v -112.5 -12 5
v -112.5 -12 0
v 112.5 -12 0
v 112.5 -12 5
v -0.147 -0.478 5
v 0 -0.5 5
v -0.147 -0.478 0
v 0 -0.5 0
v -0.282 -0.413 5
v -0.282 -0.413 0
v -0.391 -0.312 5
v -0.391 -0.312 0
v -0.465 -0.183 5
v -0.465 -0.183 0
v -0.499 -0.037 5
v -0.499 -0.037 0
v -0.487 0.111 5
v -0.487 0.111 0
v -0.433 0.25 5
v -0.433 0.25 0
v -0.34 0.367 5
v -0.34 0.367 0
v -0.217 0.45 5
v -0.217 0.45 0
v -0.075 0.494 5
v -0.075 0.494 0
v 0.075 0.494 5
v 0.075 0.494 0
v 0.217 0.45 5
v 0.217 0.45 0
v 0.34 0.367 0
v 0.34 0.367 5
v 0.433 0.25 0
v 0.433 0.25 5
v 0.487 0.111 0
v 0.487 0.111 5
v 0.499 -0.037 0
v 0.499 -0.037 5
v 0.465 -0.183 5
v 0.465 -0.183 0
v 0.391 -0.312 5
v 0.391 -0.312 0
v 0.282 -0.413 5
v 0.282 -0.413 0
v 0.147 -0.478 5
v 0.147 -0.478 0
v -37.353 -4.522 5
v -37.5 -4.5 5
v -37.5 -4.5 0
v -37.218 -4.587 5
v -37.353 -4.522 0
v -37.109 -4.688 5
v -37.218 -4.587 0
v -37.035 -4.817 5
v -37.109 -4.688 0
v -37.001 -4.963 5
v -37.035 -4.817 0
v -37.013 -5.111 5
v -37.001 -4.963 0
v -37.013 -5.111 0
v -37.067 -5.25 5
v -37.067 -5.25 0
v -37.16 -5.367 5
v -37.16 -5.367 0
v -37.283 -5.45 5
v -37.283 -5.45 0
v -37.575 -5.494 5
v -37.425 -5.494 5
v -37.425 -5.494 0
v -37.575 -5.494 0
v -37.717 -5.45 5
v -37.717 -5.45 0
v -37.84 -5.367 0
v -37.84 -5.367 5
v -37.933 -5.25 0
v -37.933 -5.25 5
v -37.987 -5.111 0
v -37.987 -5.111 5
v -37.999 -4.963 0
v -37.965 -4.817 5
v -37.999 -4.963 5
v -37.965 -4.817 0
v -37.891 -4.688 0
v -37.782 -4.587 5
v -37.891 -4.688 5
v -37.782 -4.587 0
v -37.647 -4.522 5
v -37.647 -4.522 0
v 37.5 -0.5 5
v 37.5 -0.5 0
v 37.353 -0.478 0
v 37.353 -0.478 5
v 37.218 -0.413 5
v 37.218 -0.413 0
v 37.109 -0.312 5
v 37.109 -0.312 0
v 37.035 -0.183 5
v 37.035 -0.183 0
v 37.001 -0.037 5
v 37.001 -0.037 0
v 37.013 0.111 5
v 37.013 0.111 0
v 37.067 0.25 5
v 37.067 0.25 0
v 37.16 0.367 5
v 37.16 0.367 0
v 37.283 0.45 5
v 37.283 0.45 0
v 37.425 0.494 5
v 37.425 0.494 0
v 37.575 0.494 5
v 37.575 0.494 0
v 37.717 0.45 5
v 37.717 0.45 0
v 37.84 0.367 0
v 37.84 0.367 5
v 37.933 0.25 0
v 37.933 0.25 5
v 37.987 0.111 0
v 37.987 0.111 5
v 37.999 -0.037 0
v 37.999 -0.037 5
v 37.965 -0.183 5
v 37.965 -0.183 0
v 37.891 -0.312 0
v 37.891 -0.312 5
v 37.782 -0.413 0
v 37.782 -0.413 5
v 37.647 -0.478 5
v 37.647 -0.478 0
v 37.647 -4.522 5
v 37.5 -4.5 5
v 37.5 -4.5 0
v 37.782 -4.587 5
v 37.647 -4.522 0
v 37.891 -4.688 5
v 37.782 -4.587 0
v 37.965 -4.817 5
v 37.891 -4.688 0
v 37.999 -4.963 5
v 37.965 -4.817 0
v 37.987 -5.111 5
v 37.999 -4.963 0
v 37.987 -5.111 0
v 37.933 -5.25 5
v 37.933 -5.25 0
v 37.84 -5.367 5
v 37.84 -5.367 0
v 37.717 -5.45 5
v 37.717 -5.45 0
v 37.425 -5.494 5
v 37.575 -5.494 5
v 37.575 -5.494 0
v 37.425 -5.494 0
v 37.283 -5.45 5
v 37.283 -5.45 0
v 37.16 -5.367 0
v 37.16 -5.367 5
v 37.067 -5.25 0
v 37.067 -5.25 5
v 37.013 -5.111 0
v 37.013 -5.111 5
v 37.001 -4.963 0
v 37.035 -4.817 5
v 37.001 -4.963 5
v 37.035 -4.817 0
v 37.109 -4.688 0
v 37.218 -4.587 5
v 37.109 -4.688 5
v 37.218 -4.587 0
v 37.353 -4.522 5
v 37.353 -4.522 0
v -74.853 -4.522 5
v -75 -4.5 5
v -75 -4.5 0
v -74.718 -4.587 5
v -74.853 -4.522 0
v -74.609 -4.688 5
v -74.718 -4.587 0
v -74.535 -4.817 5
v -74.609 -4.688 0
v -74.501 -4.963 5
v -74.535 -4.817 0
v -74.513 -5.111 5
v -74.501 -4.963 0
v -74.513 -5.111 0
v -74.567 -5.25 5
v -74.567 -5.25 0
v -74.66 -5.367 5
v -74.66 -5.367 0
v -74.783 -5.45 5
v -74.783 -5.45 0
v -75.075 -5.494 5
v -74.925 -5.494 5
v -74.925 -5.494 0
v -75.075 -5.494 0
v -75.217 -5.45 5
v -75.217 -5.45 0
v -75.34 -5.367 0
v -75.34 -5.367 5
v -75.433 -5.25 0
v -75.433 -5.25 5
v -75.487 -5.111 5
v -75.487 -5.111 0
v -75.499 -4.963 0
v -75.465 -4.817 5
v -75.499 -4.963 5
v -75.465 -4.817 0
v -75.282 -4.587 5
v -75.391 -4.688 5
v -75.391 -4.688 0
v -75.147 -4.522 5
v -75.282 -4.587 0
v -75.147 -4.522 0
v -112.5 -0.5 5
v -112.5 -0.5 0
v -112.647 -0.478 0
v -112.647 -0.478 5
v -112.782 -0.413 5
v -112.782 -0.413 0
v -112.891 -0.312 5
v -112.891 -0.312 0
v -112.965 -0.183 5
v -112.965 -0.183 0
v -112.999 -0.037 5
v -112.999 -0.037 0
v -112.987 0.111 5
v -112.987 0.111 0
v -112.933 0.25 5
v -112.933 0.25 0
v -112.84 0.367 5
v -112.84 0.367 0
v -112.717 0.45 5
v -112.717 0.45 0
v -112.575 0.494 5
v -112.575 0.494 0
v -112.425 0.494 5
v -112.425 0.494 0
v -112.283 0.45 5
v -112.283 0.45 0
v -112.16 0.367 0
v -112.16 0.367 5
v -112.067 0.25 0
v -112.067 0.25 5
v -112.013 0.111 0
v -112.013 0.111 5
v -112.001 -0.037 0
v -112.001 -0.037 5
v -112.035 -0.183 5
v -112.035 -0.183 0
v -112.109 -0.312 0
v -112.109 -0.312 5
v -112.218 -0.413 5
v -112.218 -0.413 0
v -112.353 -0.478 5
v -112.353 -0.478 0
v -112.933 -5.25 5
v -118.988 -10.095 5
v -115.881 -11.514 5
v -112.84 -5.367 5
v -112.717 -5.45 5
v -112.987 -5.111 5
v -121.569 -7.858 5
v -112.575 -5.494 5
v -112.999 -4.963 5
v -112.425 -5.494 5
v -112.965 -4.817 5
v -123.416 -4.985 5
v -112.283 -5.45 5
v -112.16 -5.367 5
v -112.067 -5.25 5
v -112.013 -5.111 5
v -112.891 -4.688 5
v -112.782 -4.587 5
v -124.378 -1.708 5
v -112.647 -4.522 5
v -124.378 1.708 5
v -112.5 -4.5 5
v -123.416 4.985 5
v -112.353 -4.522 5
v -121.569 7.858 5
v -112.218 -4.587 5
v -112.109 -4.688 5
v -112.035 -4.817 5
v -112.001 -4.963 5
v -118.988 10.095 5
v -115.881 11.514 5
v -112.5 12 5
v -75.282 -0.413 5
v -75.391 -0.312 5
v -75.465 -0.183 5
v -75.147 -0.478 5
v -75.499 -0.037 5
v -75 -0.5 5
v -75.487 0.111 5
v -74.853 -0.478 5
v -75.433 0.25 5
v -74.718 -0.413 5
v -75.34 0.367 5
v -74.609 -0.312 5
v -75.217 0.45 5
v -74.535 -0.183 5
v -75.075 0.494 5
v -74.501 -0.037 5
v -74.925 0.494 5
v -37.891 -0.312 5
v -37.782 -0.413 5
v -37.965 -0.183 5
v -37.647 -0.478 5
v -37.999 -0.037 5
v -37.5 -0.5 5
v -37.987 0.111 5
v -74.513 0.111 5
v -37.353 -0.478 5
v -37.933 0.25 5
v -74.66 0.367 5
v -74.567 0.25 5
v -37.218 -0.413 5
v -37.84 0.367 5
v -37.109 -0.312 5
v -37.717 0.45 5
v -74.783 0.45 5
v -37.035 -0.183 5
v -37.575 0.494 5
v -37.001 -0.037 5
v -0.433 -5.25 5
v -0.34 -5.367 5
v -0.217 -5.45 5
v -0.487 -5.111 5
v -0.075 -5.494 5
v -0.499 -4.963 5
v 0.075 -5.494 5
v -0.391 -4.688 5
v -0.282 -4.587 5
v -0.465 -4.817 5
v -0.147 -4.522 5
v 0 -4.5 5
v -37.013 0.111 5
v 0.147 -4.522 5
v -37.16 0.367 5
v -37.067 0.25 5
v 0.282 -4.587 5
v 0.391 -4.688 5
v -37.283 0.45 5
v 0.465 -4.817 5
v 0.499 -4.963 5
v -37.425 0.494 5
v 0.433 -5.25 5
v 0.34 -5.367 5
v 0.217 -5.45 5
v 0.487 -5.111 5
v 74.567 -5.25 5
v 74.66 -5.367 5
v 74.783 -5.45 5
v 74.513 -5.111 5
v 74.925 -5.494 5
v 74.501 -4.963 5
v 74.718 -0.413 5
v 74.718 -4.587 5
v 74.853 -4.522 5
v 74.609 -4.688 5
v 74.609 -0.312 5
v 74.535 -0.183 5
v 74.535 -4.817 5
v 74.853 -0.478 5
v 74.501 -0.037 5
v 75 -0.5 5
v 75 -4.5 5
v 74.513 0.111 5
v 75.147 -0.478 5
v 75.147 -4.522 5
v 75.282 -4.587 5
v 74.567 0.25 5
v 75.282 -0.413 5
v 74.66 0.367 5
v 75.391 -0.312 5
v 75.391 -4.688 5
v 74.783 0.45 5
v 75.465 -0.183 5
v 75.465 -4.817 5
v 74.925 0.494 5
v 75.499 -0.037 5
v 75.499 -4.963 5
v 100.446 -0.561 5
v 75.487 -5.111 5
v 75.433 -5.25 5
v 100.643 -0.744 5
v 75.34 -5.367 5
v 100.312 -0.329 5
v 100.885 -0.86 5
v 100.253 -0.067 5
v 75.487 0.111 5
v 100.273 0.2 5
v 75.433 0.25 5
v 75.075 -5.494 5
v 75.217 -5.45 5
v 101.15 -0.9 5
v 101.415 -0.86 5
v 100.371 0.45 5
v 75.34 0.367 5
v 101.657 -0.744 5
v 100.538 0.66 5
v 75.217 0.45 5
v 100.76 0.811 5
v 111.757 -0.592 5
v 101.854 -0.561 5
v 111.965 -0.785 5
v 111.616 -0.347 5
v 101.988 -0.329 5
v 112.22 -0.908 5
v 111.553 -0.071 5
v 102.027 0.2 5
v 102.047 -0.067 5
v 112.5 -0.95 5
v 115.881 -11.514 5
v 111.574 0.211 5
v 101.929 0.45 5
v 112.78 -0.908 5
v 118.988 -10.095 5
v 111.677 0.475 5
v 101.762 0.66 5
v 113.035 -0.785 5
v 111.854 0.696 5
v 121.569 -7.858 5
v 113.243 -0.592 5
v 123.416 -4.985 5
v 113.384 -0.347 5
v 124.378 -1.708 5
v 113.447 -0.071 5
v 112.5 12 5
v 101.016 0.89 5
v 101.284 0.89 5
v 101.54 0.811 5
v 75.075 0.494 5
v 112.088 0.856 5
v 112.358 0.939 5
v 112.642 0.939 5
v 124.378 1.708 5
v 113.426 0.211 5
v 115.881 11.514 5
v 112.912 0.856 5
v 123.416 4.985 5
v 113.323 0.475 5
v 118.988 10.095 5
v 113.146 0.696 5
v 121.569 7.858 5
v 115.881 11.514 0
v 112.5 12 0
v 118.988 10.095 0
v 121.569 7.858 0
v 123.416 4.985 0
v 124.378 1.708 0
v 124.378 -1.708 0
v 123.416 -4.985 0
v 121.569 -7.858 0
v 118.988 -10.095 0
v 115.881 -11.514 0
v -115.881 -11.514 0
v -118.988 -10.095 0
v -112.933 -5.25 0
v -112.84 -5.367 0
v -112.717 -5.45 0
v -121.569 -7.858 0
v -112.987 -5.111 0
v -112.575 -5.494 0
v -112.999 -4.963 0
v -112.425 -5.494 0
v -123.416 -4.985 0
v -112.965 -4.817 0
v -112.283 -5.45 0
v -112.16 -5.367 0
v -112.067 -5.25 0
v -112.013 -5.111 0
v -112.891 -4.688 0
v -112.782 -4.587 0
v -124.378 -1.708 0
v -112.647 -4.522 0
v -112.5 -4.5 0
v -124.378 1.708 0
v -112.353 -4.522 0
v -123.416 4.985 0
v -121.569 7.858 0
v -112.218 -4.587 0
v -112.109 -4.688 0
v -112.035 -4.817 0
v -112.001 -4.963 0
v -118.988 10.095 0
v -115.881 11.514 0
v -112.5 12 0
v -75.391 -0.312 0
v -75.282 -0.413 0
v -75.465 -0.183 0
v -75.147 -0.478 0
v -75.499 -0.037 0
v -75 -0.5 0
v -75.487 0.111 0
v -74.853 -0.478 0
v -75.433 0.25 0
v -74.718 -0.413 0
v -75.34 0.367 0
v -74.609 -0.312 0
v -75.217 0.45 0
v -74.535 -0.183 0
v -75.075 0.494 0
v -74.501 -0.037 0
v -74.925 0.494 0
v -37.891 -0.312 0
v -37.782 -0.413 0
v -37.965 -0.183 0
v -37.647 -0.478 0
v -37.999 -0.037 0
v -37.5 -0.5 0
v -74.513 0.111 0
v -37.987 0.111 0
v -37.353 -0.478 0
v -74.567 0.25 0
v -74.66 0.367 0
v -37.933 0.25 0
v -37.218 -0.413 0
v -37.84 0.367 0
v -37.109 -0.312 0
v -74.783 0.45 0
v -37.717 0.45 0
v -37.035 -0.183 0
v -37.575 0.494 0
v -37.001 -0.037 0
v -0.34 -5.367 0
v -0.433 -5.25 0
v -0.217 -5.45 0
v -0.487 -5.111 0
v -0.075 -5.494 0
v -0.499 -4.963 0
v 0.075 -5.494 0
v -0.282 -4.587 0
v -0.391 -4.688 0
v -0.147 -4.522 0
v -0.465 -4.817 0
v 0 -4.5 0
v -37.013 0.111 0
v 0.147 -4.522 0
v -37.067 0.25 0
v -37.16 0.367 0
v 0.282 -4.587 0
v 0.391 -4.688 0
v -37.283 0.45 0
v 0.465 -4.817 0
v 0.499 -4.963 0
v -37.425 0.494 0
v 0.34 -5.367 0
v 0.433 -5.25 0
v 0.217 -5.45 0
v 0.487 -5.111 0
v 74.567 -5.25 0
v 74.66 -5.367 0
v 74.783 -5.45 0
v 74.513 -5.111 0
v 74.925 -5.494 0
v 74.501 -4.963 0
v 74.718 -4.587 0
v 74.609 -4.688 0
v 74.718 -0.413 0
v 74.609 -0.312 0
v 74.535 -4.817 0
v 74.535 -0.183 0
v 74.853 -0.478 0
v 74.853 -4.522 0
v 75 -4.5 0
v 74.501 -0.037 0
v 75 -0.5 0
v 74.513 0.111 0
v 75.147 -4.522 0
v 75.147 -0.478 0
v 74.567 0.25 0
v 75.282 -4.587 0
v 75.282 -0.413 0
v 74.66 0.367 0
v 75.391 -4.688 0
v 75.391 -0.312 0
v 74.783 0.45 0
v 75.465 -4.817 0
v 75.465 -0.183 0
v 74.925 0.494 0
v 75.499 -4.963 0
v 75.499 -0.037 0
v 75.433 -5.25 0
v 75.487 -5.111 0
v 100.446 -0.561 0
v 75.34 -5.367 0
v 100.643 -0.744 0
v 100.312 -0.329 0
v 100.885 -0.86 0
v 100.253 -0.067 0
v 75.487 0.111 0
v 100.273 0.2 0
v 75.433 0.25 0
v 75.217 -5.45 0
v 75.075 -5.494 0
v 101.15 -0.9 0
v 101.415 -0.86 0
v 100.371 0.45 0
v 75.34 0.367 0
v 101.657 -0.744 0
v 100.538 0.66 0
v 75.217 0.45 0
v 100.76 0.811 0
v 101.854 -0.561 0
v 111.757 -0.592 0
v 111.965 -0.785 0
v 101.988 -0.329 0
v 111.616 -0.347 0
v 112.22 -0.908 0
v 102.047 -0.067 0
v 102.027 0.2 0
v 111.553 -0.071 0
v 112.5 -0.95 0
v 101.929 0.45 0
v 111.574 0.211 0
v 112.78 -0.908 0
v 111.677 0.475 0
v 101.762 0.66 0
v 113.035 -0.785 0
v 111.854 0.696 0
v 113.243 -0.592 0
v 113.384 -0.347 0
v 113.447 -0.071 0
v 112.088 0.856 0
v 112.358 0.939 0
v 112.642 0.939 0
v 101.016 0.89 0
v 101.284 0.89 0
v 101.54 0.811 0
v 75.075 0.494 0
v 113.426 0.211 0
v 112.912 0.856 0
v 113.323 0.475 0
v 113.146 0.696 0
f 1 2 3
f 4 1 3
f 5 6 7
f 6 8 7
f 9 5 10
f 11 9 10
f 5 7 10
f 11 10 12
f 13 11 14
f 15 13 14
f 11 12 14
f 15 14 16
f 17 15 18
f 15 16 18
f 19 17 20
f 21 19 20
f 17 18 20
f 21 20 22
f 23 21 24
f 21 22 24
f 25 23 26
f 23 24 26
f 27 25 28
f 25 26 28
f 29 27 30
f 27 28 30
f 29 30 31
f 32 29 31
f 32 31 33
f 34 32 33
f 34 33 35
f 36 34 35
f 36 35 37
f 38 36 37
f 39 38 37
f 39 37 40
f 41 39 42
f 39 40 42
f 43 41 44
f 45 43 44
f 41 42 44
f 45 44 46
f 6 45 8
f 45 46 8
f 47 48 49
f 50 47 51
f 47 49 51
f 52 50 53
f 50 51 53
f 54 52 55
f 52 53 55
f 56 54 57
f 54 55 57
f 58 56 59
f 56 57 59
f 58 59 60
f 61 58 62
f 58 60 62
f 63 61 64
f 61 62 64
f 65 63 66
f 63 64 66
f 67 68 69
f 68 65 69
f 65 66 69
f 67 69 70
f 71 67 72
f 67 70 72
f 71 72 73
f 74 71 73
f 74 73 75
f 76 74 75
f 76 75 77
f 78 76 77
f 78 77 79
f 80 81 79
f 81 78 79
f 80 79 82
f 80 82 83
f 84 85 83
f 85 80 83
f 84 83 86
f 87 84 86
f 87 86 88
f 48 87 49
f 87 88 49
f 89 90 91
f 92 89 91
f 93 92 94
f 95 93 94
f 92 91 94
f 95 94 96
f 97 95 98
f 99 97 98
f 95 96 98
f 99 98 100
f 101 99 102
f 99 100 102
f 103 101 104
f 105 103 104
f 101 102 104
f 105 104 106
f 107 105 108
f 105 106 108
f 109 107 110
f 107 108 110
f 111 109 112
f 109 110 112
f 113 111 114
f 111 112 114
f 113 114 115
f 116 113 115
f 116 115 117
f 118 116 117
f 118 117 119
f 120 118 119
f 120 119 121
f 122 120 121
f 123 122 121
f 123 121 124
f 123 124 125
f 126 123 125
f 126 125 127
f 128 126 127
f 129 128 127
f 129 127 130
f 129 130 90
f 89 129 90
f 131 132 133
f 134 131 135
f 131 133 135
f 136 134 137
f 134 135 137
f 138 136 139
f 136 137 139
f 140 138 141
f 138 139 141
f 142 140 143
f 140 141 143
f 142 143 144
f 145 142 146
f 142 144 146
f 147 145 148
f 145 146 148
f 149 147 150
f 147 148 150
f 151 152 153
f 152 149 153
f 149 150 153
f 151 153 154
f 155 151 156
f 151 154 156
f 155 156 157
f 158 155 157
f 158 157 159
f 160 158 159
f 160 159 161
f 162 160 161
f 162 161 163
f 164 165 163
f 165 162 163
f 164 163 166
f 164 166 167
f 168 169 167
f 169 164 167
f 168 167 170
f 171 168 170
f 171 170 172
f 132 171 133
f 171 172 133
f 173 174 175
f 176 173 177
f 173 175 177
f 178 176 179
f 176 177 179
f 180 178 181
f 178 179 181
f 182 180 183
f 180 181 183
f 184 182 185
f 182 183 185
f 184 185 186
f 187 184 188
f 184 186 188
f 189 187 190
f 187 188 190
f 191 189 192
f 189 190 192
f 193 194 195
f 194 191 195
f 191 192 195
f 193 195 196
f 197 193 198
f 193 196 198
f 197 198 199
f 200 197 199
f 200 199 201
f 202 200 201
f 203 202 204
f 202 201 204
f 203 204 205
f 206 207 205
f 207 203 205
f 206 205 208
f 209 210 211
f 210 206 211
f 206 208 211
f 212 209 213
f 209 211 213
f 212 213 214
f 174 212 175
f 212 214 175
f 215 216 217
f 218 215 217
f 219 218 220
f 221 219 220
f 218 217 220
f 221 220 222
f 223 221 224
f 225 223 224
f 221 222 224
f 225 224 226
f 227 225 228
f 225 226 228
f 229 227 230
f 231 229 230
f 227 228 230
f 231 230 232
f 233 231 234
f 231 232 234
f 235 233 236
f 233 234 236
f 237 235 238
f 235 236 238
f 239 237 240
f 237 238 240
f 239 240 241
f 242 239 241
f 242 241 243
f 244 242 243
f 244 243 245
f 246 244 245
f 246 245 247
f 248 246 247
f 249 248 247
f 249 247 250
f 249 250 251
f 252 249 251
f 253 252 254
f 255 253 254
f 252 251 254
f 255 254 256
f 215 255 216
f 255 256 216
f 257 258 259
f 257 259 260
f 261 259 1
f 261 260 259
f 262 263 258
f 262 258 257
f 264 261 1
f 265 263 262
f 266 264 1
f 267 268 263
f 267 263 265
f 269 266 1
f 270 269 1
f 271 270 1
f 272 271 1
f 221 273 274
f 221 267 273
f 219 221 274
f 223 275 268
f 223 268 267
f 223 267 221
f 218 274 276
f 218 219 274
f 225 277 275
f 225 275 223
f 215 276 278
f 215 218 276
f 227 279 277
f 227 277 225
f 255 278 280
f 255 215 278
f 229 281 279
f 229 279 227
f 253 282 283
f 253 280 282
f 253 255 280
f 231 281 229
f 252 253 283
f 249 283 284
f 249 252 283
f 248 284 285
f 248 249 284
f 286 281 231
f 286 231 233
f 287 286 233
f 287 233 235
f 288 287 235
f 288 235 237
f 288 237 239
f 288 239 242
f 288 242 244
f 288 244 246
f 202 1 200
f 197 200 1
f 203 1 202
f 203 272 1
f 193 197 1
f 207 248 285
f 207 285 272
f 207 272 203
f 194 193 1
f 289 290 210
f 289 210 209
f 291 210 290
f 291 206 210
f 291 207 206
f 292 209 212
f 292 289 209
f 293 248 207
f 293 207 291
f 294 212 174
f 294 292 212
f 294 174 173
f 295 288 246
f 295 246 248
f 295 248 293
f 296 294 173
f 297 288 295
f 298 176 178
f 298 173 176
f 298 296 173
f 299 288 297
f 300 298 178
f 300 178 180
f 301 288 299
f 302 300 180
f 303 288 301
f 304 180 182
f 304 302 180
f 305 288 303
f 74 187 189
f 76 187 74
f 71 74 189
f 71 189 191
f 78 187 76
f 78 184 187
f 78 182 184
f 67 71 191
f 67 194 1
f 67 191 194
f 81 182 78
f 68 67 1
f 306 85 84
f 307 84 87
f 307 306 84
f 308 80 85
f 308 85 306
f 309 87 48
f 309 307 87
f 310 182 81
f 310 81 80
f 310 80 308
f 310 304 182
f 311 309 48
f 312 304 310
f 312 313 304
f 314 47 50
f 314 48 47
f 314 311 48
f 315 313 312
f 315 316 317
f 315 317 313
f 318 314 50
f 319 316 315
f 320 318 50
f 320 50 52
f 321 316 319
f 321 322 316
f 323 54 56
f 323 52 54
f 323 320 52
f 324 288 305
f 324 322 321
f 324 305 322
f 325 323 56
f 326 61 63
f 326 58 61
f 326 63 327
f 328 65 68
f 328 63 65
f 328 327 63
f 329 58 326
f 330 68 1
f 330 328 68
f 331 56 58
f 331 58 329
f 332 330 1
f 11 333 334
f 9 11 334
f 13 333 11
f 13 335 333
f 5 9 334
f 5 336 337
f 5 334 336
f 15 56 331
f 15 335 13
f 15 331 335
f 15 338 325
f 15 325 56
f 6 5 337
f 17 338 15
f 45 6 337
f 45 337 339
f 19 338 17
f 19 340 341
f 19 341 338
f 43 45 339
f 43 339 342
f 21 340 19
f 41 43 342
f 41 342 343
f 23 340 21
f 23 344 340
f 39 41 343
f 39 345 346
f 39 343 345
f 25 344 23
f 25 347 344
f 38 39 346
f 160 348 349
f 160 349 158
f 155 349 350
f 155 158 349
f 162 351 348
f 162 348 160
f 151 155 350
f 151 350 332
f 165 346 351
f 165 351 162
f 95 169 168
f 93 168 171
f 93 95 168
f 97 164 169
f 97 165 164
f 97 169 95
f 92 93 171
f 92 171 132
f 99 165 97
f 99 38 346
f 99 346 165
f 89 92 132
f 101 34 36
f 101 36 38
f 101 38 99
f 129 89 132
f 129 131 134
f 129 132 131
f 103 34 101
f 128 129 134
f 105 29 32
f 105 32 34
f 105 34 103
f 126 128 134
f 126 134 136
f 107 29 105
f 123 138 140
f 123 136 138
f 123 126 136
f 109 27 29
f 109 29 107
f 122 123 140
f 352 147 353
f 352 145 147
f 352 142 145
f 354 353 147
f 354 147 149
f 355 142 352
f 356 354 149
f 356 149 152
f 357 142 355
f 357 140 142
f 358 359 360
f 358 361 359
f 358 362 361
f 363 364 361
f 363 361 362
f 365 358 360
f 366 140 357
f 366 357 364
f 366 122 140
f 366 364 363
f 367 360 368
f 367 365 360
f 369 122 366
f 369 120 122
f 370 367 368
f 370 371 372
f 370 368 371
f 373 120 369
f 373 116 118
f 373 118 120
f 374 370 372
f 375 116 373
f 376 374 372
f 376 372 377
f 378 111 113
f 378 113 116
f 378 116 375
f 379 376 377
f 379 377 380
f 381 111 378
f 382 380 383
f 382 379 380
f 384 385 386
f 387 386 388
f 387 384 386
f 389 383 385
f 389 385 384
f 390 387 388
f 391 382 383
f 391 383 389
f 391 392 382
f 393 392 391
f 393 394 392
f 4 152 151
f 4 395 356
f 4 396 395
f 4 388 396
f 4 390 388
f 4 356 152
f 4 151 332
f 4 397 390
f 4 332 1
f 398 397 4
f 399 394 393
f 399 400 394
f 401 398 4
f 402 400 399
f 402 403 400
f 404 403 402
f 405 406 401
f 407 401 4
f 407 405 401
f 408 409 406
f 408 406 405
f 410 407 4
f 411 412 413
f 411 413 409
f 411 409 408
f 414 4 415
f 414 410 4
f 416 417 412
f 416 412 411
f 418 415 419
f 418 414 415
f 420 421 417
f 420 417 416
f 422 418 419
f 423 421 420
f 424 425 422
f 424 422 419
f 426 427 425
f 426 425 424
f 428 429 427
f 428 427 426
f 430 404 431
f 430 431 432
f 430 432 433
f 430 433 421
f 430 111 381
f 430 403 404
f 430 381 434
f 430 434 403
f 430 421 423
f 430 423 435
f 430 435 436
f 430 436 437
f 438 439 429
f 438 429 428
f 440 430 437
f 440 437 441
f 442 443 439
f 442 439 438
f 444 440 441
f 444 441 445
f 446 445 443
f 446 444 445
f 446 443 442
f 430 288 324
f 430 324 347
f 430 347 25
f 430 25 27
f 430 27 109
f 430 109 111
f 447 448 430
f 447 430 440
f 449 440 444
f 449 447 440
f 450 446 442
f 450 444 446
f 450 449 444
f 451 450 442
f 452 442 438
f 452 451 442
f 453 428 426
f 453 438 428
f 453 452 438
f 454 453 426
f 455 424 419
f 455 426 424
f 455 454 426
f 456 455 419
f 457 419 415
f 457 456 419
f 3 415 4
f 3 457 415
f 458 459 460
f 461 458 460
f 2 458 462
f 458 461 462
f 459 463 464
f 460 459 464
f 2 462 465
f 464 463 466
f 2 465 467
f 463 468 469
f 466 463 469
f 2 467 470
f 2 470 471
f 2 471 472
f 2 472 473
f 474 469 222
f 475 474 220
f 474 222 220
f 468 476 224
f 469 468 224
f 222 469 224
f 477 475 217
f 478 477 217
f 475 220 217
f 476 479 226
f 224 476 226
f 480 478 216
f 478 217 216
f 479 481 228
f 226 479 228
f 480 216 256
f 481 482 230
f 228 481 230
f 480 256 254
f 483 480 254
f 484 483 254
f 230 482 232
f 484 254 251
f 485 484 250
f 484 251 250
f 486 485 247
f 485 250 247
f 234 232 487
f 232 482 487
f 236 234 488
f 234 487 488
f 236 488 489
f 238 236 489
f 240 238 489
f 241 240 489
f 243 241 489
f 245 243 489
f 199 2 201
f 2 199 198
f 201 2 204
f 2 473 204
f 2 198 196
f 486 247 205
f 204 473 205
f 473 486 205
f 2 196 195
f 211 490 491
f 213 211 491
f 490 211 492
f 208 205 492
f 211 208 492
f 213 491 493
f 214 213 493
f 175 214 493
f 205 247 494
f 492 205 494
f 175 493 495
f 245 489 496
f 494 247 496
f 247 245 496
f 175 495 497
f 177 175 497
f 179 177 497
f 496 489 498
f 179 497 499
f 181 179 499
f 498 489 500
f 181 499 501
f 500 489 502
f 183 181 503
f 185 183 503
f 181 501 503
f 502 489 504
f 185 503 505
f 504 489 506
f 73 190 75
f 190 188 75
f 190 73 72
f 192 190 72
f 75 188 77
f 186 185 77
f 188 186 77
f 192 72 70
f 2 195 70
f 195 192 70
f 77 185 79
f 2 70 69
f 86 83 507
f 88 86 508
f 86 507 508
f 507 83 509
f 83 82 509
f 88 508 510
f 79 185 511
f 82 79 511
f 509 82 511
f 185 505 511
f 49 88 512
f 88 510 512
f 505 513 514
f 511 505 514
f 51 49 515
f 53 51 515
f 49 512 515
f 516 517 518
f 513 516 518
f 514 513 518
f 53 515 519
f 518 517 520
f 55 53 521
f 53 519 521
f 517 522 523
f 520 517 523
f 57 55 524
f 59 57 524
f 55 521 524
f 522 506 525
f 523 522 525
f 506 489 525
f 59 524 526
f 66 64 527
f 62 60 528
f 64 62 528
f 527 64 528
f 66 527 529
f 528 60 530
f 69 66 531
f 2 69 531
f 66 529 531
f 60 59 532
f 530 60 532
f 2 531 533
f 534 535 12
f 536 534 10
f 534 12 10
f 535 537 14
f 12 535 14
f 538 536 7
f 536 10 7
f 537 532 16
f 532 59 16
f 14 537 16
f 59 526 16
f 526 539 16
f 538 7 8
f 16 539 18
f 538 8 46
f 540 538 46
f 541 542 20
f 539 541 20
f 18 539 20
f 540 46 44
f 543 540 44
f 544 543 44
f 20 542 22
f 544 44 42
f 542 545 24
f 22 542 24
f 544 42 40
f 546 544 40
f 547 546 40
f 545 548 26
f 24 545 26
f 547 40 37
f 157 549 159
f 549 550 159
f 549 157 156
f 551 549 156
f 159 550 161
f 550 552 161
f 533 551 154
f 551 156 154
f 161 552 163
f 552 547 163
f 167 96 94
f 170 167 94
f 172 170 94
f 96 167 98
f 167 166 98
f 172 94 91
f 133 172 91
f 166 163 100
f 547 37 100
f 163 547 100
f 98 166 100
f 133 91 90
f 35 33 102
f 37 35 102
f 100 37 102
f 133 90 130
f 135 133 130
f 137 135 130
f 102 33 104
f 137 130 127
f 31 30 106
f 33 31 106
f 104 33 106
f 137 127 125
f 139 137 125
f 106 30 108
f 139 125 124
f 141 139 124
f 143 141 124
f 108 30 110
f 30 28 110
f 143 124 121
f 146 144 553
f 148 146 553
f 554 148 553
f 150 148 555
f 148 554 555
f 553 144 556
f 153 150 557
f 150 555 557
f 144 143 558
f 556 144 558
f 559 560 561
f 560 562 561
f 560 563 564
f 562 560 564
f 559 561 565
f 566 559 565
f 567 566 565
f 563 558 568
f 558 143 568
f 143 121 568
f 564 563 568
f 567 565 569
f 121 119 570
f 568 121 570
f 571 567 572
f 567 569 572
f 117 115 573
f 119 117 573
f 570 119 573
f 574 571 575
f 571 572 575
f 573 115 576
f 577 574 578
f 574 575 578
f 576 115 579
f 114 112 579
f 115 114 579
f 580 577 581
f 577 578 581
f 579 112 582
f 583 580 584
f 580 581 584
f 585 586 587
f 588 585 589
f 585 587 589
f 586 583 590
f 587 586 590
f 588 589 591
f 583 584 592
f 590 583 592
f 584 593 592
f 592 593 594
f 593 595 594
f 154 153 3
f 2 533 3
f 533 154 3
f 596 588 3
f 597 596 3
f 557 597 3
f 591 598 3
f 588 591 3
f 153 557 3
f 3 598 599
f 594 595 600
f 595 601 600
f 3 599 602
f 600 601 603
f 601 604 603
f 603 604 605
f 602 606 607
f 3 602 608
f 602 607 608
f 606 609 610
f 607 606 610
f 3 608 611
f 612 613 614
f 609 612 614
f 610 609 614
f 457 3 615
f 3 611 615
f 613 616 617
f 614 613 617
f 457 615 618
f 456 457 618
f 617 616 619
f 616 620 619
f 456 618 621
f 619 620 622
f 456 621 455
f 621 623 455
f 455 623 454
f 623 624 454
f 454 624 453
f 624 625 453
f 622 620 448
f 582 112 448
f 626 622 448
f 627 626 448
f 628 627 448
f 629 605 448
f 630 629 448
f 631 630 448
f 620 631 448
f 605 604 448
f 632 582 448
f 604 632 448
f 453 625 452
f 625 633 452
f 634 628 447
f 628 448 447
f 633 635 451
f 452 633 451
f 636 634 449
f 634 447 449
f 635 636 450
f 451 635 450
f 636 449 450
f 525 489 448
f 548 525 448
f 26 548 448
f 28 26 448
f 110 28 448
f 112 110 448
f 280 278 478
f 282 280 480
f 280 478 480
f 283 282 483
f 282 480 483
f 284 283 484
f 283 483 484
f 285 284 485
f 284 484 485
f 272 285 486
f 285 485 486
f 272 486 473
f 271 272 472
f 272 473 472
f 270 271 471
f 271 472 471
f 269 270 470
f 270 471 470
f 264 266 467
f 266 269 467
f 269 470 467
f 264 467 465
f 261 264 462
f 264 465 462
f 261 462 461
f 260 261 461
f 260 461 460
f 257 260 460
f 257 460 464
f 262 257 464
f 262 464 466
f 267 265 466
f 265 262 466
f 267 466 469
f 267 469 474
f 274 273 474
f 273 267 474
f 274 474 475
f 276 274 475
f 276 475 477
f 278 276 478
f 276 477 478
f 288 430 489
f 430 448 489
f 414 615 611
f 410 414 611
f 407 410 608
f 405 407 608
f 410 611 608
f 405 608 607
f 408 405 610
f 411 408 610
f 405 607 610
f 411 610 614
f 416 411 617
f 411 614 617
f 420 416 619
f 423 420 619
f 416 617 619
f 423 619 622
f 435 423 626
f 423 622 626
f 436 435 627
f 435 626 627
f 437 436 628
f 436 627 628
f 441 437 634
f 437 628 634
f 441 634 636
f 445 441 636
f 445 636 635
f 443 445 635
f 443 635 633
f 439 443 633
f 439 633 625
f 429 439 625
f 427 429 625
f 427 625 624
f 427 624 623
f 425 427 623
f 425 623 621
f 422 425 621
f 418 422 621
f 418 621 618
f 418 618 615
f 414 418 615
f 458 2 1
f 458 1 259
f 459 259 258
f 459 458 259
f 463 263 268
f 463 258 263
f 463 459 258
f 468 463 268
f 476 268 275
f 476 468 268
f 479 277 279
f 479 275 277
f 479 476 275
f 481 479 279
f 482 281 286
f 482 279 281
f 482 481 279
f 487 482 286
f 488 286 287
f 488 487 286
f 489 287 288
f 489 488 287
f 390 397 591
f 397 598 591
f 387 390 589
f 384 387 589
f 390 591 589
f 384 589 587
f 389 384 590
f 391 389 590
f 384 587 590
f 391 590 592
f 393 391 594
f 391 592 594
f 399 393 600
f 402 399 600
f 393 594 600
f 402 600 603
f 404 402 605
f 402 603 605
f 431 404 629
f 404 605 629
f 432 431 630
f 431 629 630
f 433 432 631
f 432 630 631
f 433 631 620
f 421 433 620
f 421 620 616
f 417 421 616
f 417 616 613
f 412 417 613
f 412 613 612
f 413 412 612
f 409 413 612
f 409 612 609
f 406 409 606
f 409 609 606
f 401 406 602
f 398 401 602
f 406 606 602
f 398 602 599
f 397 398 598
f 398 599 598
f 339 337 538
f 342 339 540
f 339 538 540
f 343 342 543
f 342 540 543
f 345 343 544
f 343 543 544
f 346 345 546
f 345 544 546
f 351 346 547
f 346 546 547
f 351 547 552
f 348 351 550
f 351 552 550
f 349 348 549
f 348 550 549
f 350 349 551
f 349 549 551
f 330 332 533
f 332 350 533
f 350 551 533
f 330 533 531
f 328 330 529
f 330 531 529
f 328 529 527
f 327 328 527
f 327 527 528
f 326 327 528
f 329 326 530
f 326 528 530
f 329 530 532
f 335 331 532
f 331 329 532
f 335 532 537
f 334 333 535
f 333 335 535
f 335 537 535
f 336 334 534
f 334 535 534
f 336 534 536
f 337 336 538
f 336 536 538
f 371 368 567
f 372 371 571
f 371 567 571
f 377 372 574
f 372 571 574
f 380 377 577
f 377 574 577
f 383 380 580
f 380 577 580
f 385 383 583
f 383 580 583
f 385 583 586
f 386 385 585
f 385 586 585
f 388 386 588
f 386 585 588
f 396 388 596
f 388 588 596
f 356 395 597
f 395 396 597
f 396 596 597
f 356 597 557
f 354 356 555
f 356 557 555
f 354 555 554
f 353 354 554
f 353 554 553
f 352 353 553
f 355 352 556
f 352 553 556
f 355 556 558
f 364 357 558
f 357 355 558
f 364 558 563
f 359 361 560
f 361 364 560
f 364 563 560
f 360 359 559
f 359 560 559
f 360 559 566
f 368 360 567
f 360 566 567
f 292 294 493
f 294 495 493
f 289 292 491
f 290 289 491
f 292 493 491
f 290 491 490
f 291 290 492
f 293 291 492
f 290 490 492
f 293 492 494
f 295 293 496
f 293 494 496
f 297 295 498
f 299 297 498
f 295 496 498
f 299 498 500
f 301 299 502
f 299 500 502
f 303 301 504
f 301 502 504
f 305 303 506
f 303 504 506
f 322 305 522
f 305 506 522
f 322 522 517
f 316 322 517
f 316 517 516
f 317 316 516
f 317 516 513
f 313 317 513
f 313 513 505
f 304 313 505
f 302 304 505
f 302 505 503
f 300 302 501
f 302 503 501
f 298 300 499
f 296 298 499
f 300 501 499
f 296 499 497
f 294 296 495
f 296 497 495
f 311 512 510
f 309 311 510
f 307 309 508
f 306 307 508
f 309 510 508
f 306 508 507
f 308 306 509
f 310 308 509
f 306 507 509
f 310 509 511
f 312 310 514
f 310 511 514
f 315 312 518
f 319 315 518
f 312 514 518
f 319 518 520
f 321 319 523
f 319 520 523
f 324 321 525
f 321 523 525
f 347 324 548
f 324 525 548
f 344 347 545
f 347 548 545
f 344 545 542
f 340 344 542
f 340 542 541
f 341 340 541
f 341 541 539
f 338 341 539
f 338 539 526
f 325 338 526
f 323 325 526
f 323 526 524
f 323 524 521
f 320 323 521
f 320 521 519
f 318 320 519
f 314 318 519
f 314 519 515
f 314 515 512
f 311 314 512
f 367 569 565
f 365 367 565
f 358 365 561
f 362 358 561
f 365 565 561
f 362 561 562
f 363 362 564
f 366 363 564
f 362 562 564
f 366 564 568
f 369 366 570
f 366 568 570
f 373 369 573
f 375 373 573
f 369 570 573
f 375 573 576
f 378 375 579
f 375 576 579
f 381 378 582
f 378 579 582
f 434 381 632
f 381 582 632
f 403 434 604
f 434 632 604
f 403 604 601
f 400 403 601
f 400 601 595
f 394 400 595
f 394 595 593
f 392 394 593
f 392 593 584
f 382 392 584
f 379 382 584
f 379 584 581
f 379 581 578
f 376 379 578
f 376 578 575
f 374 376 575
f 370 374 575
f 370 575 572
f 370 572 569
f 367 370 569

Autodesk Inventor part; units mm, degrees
ref_plane "YZ Plane" through (0, 0, 0) normal (1, 0, 0) x (0, 1, 0)
ref_plane "XY Plane" through (0, 0, 0) normal (0, 0, 1) x (1, 0, 0)
sketch "Sketch1" plane through (0, 0, 0) normal (0, 0, 1) x (1, 0, 0)
  line L0 (112.5, 0) -> (-112.5, 0) construction
  line L1 (112.5, 12) -> (-112.5, 12)
  line L2 (-112.5, -12) -> (112.5, -12)
  arc A0 (112.5, -12) -> (112.5, 12) centre (112.5, 0) ccw
  arc A1 (-112.5, 12) -> (-112.5, -12) centre (-112.5, 0) ccw
  point P0 (0, 0)
  dimension "d0" = 225
  dimension "d1" = 12
extrude "Extrusion1" add sketch "Sketch1" along normal blind 5
sketch "Sketch2" plane through (0, 0, 5) normal (0, 0, 1) x (1, 0, 0)
  arc A0 (112.5, -12) -> (112.5, 12) centre (112.5, 0) ccw projected
  point P0 (0, 0)
hole "Hole1" at (112.5, 0, 5) direction (0, 0, -1) diameter 1.9 end through all
sketch "Sketch3" plane through (0, 0, 5) normal (0, 0, 1) x (1, 0, 0)
  arc A0 (-112.5, 12) -> (-112.5, -12) centre (-112.5, 0) ccw projected
  circle A1 centre (112.5, 0) radius 0.95 projected
  point P0 (0, 0)
  point P1 (75, 0)
  point P2 (37.5, 0)
  point P3 (0, 0)
  point P4 (-37.5, 0)
  point P5 (-75, 0)
  dimension "d33" = 37.5
  dimension "d34" = 37.5
  dimension "d35" = 37.5
  dimension "d36" = 37.5
hole "Hole2" at (-112.5, 0, 5) at (-75, 0, 5) at (-37.5, 0, 5) at (0, 0, 5) at (37.5, 0, 5) at (75, 0, 5) direction (0, 0, -1) diameter 1 end through all
sketch "Sketch4" plane through (0, 0, 5) normal (0, 0, 1) x (1, 0, 0)
  circle A0 centre (112.5, 0) radius 0.95 projected
  point P0 (0, 0)
  point P1 (105, 0)
  point P2 (101.15, 0)
  dimension "d18" = 7.5
  dimension "d32" = 3.85
hole "Hole3" at (101.15, 0, 5) direction (0, 0, -1) diameter 1.8 end through all
ref_plane "Work Plane1" through (0, -2.5, 0) normal (0, 1, 0) x (-1, 0, 0)
mirror "Mirror1" about plane through (0, -2.5, 0) normal (0, 1, 0) of "Hole2"
sketch "Sketch5" plane through (0, 0, 5) normal (0, 0, 1) x (1, 0, 0)
  circle A0 centre (112.5, 0) radius 0.95 projected
  point P0 (0, 0)
equation "\"d34\" = d33"
equation "\"d35\" = d34"
equation "\"d36\" = d35"
properties part number "Motor linkage"
